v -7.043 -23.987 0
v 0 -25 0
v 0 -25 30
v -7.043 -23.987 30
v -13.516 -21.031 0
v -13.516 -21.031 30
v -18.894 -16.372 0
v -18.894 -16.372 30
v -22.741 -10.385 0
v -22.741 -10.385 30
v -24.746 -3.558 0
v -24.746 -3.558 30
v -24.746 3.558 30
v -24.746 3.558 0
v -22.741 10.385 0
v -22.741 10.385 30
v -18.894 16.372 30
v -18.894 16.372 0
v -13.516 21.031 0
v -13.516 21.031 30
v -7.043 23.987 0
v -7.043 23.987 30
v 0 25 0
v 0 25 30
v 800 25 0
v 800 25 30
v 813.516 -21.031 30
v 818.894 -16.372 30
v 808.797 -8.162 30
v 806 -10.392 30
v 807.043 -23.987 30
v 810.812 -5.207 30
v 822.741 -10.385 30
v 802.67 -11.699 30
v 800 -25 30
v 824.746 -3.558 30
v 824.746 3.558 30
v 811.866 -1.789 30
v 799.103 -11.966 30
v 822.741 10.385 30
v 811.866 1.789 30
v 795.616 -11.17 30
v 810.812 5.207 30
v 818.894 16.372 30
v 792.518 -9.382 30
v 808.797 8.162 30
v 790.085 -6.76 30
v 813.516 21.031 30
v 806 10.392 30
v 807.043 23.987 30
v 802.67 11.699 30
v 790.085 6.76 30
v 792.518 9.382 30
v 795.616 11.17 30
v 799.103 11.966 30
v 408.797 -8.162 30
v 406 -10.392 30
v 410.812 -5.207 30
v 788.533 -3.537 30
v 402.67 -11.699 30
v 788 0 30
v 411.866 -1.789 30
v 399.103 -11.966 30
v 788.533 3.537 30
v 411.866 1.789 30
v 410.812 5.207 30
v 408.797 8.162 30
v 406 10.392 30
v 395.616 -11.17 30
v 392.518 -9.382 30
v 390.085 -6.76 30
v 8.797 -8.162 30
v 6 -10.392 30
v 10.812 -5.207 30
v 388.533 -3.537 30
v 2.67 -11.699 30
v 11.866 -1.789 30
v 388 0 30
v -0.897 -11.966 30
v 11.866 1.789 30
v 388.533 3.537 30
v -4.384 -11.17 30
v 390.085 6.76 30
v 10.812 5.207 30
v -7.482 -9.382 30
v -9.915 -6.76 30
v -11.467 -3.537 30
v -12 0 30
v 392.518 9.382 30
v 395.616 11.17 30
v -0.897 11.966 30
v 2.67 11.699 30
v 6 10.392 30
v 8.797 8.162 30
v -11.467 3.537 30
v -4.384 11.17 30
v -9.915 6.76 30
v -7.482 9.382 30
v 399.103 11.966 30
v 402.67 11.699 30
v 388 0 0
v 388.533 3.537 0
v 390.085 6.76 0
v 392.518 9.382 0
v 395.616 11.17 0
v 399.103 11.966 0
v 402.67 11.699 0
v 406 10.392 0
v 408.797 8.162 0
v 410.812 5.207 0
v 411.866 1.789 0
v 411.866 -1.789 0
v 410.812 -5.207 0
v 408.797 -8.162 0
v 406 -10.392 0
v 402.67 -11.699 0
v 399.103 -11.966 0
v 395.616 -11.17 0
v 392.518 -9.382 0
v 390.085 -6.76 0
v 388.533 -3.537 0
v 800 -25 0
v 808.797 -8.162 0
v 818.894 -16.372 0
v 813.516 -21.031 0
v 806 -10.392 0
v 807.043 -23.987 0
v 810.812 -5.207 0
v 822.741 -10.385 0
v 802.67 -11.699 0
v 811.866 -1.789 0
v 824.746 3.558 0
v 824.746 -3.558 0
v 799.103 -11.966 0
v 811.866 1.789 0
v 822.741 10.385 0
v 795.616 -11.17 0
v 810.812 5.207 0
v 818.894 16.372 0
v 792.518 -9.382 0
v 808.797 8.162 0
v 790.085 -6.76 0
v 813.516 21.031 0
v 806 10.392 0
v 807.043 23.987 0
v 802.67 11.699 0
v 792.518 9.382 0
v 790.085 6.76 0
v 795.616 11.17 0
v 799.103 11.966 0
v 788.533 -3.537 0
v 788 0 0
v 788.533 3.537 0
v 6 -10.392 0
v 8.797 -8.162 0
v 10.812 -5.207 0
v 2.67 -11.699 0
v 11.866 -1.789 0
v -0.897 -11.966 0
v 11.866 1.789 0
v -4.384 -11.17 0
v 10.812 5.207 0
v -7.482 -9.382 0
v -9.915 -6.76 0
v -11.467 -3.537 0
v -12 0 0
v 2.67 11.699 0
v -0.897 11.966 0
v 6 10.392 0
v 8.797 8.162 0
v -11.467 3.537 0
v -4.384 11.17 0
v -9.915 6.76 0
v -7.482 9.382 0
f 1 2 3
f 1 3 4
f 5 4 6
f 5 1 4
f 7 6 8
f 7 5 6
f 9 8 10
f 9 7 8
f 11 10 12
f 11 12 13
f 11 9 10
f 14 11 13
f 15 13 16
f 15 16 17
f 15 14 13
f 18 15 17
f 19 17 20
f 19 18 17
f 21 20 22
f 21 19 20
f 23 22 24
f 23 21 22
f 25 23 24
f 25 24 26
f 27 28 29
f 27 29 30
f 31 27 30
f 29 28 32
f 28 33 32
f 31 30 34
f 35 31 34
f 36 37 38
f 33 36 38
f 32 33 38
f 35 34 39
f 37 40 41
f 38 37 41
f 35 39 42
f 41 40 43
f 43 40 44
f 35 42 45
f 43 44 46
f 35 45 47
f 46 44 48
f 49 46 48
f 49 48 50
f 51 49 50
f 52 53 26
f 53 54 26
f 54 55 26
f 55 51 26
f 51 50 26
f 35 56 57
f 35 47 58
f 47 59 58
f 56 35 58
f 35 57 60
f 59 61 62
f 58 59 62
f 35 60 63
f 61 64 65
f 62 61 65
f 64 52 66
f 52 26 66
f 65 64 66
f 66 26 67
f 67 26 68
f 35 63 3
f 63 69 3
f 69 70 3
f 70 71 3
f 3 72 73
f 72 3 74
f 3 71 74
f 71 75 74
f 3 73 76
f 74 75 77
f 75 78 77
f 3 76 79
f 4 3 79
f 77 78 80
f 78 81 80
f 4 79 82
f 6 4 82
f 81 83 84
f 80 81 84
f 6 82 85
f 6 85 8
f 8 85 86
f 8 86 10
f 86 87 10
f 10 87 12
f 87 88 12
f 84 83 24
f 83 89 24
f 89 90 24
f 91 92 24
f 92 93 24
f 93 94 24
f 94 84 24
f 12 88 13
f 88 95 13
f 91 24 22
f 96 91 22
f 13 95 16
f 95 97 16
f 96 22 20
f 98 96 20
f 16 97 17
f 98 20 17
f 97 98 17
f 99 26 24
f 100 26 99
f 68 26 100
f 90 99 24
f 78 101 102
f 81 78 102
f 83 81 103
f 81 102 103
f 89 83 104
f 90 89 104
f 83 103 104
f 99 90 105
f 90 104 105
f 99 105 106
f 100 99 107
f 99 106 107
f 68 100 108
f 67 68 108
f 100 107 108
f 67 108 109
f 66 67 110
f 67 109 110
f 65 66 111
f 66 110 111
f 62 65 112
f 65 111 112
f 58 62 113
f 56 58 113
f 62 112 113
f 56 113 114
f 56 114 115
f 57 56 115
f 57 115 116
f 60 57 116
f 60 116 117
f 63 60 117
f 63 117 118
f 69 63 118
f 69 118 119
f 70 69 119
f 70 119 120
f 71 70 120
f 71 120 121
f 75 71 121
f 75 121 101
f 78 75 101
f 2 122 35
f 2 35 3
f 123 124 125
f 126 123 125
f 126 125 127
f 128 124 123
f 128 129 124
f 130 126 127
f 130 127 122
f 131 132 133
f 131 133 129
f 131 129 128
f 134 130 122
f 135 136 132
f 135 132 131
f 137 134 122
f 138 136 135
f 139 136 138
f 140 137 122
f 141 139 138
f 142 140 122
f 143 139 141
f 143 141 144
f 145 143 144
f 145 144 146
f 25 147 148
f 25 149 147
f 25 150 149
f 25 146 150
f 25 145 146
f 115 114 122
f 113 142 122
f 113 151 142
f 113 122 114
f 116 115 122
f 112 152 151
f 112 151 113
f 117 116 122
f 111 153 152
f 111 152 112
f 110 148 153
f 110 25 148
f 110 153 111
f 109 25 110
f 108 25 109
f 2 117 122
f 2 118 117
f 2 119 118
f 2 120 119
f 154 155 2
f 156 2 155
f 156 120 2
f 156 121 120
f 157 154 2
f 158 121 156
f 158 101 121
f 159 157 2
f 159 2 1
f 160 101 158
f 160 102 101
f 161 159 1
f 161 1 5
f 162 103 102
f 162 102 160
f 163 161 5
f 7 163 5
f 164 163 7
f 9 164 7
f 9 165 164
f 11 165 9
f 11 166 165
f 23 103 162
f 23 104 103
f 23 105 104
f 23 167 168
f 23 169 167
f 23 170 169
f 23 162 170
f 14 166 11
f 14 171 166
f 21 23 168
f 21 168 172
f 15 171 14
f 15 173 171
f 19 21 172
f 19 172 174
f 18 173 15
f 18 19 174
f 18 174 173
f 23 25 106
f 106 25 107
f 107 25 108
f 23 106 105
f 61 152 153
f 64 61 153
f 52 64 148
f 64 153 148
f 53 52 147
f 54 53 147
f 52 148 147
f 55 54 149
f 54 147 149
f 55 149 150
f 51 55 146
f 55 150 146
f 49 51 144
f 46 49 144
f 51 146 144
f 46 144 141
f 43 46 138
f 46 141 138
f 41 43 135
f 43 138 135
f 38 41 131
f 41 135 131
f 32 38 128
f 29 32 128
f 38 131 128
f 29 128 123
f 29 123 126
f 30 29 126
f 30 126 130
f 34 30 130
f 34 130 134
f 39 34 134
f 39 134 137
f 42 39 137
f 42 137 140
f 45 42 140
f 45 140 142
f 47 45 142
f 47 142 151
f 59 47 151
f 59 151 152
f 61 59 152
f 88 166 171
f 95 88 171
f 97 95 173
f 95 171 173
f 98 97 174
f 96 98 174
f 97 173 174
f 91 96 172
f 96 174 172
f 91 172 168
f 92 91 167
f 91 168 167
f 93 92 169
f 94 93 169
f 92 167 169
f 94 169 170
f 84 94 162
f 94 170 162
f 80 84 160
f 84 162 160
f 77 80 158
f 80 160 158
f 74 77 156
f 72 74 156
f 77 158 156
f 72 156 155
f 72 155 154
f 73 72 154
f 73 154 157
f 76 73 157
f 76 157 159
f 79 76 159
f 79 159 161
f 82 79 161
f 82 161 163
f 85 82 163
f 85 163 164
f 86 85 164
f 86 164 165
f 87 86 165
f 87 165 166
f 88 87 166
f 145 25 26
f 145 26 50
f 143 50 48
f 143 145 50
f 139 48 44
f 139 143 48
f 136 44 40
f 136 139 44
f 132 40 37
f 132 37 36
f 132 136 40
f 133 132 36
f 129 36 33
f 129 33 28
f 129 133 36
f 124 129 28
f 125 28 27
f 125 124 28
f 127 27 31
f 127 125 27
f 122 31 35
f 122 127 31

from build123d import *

# Parameters (mm, degrees)
BOSS_EXTRUDE2_DEPTH   = 30
F_3_0MM_DOWEL_HOLE1_D = 24


with BuildPart() as part:
    # Sketch1 → Boss-Extrude2 (new body)
    with BuildSketch(Plane.XY):
        with BuildLine():
            Line((0, 25), (800, 25))
            ThreePointArc((800, 25), (825, 0), (800, -25))
            Line((800, -25), (0, -25))
            ThreePointArc((0, -25), (-25, 0), (0, 25))
        make_face()
    extrude(amount=BOSS_EXTRUDE2_DEPTH)

    # Ø3.0mm Dowel Hole1 (through all)
    with Locations(Plane.XY.offset(30)):
        with Locations((0, 0), (800, 0), (400, 0)):
            Hole(F_3_0MM_DOWEL_HOLE1_D / 2)


solid = part.part
